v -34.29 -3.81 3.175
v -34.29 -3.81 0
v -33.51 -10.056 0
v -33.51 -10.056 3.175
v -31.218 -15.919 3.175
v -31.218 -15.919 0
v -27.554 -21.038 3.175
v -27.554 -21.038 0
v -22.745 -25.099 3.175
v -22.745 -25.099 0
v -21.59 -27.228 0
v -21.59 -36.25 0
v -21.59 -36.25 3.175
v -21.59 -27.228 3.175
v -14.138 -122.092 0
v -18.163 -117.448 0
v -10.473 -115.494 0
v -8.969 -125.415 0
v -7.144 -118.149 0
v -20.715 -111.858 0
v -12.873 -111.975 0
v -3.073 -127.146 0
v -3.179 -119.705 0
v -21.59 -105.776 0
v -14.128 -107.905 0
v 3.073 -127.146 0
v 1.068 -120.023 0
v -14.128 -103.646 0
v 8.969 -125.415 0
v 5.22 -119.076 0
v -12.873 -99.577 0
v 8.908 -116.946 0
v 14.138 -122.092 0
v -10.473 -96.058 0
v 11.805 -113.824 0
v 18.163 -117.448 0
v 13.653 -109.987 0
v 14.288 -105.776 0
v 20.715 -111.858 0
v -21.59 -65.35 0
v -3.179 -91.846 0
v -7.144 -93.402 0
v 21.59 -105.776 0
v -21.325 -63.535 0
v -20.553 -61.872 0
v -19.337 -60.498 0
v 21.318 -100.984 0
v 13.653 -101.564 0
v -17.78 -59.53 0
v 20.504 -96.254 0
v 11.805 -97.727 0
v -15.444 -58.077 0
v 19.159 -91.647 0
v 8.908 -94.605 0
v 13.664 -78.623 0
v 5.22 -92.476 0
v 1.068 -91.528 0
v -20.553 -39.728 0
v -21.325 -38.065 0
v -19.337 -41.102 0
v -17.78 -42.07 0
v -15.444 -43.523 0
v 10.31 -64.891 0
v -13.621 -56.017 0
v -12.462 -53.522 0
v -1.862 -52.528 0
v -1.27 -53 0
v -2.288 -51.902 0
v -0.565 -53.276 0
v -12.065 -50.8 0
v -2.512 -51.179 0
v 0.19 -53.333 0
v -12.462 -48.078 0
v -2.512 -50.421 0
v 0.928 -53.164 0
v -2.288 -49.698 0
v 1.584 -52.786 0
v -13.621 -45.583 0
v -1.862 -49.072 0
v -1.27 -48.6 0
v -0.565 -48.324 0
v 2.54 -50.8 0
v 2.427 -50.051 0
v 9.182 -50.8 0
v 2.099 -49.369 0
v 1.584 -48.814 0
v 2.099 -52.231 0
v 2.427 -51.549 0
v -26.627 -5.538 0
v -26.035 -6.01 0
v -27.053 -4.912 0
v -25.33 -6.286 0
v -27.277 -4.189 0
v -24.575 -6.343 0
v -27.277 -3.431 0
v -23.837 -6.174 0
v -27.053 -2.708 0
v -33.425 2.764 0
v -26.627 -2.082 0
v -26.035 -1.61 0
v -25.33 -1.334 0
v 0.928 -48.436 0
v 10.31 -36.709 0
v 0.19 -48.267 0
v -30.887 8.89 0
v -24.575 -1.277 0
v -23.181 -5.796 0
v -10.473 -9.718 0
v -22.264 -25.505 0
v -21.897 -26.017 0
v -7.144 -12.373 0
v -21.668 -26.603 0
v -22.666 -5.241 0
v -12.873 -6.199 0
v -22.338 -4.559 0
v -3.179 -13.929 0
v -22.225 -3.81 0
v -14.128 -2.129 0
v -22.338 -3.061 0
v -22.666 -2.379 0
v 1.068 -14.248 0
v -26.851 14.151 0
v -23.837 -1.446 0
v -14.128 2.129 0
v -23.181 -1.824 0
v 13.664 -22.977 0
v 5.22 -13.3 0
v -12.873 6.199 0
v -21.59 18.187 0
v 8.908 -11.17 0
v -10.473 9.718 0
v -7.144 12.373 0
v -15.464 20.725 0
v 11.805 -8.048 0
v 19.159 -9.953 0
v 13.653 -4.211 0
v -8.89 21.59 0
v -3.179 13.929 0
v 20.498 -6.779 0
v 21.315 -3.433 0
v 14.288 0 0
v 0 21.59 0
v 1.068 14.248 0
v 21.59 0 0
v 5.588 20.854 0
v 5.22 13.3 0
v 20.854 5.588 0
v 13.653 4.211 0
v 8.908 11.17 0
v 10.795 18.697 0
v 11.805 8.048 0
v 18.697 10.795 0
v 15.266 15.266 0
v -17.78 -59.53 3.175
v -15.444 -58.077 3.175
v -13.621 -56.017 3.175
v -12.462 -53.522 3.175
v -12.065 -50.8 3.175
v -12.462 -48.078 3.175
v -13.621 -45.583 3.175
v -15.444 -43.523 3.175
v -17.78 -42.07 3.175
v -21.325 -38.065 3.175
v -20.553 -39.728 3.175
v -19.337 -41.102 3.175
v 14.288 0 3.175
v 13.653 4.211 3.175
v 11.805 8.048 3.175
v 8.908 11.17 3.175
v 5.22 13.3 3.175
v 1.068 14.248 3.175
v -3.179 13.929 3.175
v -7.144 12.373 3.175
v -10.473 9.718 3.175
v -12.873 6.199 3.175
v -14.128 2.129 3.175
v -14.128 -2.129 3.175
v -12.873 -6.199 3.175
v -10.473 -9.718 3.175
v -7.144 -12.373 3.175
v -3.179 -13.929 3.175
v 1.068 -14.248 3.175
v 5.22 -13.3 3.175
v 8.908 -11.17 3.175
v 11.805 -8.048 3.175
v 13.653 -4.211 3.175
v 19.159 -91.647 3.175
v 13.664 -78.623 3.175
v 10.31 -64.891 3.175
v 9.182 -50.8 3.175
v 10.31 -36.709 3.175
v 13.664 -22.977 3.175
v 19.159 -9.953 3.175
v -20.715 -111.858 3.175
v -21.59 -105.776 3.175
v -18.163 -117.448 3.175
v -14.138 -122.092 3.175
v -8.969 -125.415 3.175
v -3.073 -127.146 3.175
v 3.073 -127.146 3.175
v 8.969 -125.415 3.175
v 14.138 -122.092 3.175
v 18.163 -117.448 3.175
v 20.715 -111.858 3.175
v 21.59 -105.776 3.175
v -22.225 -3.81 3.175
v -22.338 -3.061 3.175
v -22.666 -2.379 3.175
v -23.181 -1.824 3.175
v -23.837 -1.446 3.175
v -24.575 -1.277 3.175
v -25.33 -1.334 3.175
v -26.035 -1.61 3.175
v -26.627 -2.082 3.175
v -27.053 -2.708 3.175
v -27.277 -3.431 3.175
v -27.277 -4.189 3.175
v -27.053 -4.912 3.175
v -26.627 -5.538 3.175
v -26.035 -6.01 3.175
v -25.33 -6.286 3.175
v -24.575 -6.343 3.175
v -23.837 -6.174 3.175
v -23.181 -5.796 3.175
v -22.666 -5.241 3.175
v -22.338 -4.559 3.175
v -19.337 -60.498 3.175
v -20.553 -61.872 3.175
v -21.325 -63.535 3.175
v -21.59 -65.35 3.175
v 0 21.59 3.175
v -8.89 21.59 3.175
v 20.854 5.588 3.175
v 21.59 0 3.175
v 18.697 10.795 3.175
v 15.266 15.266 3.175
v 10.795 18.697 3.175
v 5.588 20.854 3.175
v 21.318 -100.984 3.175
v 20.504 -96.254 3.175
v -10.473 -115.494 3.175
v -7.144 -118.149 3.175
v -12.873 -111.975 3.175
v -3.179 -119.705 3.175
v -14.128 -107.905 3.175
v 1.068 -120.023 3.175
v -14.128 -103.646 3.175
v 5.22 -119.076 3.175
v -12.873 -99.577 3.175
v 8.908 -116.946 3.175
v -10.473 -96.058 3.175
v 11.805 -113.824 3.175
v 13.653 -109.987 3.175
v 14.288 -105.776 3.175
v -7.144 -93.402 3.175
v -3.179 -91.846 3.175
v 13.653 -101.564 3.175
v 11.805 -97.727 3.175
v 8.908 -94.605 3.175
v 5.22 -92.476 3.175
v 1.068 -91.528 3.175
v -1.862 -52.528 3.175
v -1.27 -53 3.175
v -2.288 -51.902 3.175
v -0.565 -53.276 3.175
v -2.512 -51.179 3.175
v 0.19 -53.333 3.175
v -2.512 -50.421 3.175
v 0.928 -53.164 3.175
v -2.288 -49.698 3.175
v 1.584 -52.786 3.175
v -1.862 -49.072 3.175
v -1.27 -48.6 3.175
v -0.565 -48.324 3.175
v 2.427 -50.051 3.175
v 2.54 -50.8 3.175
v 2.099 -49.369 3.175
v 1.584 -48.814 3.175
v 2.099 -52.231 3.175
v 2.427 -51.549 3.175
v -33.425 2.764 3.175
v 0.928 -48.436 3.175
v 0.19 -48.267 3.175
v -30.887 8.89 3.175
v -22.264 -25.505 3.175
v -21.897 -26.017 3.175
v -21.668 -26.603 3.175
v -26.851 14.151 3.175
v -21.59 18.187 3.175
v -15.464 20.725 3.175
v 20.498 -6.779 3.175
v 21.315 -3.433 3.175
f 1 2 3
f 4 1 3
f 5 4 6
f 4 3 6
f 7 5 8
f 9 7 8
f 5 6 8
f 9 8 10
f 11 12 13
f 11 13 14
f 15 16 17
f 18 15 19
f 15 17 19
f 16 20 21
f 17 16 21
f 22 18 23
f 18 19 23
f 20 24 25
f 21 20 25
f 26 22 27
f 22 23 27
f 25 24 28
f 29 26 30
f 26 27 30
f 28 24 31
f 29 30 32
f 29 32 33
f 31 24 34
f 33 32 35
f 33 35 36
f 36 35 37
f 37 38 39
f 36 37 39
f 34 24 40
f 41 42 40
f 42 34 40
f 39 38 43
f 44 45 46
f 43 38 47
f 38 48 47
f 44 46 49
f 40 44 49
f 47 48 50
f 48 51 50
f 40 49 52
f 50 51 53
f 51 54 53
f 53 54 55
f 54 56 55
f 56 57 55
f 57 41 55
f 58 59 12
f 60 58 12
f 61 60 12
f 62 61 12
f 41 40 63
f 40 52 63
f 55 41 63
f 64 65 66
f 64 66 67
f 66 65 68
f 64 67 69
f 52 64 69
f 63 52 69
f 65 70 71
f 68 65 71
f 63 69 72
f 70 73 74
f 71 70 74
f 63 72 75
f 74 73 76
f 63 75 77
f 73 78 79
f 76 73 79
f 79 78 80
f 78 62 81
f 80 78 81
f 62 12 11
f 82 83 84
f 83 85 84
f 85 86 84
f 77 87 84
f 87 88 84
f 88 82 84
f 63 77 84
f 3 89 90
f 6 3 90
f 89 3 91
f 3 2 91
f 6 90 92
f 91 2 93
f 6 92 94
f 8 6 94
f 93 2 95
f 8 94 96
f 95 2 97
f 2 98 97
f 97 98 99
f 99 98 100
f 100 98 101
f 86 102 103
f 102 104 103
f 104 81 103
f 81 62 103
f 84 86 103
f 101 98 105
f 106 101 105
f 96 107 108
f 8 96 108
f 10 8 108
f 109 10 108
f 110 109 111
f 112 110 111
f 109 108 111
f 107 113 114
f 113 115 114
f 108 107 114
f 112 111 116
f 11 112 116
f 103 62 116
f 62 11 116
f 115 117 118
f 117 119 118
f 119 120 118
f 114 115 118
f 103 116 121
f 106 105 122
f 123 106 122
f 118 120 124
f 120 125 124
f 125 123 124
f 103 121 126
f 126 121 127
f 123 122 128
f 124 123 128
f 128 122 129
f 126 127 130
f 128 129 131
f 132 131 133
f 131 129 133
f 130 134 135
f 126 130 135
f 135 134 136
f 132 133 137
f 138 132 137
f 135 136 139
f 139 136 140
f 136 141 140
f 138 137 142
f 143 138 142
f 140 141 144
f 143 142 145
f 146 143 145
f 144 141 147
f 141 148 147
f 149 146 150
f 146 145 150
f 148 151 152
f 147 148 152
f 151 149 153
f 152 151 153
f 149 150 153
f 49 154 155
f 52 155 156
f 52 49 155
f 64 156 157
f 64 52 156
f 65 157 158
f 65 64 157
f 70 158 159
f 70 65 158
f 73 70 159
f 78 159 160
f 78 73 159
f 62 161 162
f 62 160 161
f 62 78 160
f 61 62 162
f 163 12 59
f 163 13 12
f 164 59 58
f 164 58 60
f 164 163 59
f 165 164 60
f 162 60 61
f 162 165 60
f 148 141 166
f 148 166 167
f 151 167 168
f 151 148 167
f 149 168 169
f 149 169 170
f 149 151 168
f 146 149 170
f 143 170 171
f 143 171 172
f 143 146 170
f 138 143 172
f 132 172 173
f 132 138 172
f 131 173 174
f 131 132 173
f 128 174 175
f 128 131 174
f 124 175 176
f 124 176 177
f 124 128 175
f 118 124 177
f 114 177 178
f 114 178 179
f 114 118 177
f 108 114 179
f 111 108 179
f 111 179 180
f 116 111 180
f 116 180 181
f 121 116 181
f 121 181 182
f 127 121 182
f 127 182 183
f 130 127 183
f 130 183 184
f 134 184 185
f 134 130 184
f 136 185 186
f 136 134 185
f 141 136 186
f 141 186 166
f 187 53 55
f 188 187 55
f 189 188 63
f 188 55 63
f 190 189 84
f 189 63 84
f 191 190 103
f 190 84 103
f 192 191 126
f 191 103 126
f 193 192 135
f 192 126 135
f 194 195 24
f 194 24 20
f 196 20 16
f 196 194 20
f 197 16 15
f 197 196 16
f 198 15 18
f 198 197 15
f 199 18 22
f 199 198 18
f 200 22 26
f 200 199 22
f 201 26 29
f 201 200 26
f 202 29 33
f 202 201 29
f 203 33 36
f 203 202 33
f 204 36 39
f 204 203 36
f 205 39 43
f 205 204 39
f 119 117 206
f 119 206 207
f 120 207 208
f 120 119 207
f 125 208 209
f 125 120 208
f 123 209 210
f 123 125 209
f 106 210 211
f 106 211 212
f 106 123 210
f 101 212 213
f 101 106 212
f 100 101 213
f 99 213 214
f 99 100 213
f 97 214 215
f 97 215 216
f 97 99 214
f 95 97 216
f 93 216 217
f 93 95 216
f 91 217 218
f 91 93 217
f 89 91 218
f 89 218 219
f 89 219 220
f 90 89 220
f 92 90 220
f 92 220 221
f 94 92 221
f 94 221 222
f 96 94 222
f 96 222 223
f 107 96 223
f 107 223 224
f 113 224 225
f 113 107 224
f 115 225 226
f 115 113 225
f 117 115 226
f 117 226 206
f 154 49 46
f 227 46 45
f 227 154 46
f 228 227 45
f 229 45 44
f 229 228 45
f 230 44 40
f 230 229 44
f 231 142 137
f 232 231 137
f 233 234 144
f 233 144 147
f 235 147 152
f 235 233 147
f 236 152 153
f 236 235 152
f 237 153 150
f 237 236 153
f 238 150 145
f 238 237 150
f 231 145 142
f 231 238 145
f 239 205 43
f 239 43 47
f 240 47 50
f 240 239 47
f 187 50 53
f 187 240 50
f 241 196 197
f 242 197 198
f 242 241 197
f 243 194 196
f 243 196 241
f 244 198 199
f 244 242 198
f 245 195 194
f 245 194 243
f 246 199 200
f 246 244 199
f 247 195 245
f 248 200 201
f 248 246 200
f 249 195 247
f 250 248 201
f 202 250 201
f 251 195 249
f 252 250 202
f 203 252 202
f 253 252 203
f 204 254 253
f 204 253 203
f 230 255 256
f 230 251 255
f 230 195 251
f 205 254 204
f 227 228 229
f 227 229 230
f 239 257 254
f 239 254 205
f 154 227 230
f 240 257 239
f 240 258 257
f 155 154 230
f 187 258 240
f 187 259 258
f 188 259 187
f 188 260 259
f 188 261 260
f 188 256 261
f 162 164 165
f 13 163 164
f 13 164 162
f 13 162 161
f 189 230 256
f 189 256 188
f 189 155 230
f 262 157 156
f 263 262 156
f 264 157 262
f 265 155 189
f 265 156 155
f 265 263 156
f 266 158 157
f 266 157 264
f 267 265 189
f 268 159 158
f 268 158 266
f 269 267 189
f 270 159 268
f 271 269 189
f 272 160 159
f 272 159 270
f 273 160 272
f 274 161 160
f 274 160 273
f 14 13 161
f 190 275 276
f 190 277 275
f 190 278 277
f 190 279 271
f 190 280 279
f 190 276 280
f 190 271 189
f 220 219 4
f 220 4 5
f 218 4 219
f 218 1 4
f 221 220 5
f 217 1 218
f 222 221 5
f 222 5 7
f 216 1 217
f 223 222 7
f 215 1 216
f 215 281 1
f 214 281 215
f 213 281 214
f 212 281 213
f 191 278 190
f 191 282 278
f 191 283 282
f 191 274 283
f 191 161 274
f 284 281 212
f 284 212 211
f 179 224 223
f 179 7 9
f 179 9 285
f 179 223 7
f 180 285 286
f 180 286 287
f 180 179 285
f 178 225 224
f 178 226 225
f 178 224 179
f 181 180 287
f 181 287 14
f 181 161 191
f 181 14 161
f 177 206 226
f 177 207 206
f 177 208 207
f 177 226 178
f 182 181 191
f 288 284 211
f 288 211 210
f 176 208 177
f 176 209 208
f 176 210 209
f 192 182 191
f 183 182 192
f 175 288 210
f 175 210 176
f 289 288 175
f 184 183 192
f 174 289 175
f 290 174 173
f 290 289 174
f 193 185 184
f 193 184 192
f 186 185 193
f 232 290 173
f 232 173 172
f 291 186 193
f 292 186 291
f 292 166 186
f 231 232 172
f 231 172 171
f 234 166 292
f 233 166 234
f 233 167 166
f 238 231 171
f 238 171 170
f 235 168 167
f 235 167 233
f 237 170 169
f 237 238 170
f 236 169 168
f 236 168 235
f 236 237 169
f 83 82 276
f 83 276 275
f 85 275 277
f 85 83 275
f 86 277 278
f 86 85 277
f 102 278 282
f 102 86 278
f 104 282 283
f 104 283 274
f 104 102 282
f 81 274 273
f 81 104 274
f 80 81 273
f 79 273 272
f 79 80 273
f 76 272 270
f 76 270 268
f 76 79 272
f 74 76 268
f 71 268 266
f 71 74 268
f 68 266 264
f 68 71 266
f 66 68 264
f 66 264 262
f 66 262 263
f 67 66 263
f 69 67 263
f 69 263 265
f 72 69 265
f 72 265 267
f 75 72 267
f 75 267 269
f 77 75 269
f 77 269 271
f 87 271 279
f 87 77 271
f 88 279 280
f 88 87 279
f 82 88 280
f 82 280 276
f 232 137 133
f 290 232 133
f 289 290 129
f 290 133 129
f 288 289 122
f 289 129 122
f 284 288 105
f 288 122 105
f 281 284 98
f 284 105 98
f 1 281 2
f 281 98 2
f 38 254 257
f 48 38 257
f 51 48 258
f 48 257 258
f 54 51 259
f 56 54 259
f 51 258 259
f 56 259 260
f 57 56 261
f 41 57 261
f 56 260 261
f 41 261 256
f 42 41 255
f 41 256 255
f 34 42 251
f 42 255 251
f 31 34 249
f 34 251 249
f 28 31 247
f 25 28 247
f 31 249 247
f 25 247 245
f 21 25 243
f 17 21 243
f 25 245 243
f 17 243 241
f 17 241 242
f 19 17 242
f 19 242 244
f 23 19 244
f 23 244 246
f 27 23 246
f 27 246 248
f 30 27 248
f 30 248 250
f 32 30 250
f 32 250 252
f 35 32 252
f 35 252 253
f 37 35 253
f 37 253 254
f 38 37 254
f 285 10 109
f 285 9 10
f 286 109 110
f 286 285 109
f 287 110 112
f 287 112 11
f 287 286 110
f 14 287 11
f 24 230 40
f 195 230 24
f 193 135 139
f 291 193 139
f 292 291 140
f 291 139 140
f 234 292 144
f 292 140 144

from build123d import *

# Parameters (mm, degrees)
SKETCH1_R            = 14.2875
SKETCH1_R_2          = 2.54
BOSS_EXTRUDE1_DEPTH  = 3.175
CUT_EXTRUDE1_DEPTH   = 162.674043733
FILLET3_R            = 6.35
BOSS_EXTRUDE3_START  = -3.175
SKETCH3_R            = 2.54
BOSS_EXTRUDE3_DEPTH  = 3.175
SKETCH6_R            = 2.54
BOSS_EXTRUDE4_DEPTH  = 3.175
FILLET2_R            = 6.35
CUT_EXTRUDE2_DEPTH   = 168.423732074
CUT_EXTRUDE3_DEPTH   = 168.423732074
CUT_EXTRUDE4_DEPTH   = 168.265702461
BOSS_EXTRUDE8_START  = -3.175
SKETCH15_R           = 2.54
BOSS_EXTRUDE8_DEPTH  = 3.175
FILLET4_R            = 2.54
BOSS_EXTRUDE9_DEPTH  = 3.175
SKETCH17_R           = 14.2875
BOSS_EXTRUDE10_DEPTH = 3.175
CUT_EXTRUDE5_DEPTH   = 132.939082706
SKETCH20_R           = 14.2875
CUT_EXTRUDE6_DEPTH   = 132.939082706


with BuildPart() as part:
    # Sketch1 → Boss-Extrude1 (new body)
    with BuildSketch(Plane.XY):
        with BuildLine():
            Line((-8.89, 25.4), (8.89, 25.4))
            ThreePointArc((8.89, 25.4), (17.870256121, 21.680256121), (21.59, 12.7))
            Line((21.59, 12.7), (21.59, -117.775079775))
            ThreePointArc((21.59, -117.775079775), (21.127743647, -120.388718212), (19.797058824, -122.685251408))
            Line((19.797058824, -122.685251408), (-7.952696208, -155.616779465))
            ThreePointArc((-7.952696208, -155.616779465), (-12.268297602, -157.851943494), (-16.900388255, -156.380852124))
            Line((-16.900388255, -156.380852124), (-32.439211784, -143.287061102))
            ThreePointArc((-32.439211784, -143.287061102), (-34.674375812, -138.971459708), (-33.203284443, -134.339369055))
            Line((-33.203284443, -134.339369055), (-23.382941176, -122.685251408))
            ThreePointArc((-23.382941176, -122.685251408), (-22.052256353, -120.388718212), (-21.59, -117.775079775))
            Line((-21.59, -117.775079775), (-21.59, 12.7))
            ThreePointArc((-21.59, 12.7), (-17.870256121, 21.680256121), (-8.89, 25.4))
        make_face()
        Circle(SKETCH1_R, mode=Mode.SUBTRACT)
        with Locations((0, -101.6)):
            Circle(SKETCH1_R, mode=Mode.SUBTRACT)
        with Locations((-18.532085478, -142.550133084)):
            Circle(SKETCH1_R_2, mode=Mode.SUBTRACT)
        with Locations((0, -50.8)):
            Circle(SKETCH1_R_2, mode=Mode.SUBTRACT)
    extrude(amount=BOSS_EXTRUDE1_DEPTH)

    # Sketch2 → Cut-Extrude1 (cut, through all)
    with BuildSketch(Plane.XY):
        with BuildLine():
            ThreePointArc((19.159083004, -91.647229609), (9.182340769, -50.8), (19.159083004, -9.952770391))
            ThreePointArc((19.159083004, -9.952770391), (20.973467787, -5.122670102), (21.59, 0))
            Line((21.59, 0), (27.94, 0))
            Line((27.94, 0), (27.94, -121.656687185))
            Line((27.94, -121.656687185), (-7.789552878, -164.05809836))
            Line((-7.789552878, -164.05809836), (-17.501317584, -155.874478972))
            Line((-17.501317584, -155.874478972), (16.51, -115.512152961))
            ThreePointArc((16.51, -115.512152961), (20.280273667, -109.005308906), (21.59, -101.6))
            ThreePointArc((21.59, -101.6), (20.973467787, -96.477329898), (19.159083004, -91.647229609))
        make_face()
        with BuildLine():
            Line((-21.59, -41.275), (-21.59, -60.325))
            ThreePointArc((-21.59, -60.325), (-12.065, -50.8), (-21.59, -41.275))
        make_face()
    extrude(amount=CUT_EXTRUDE1_DEPTH, mode=Mode.SUBTRACT)

    # Fillet3
    fillet3_edges = [part.edges().sort_by_distance(p)[0] for p in [
        (-21.59, -41.275, 1.5875),
        (-21.59, -60.325, 1.5875),
    ]]
    fillet(fillet3_edges, radius=FILLET3_R)

    # Sketch3 → Boss-Extrude3 (add)
    with BuildSketch(Plane.XY.offset(3.175).offset(BOSS_EXTRUDE3_START)):
        with BuildLine():
            Line((-27.351416194, -127.394768527), (-36.025496499, -137.688579))
            ThreePointArc((-36.025496499, -137.688579), (-37.217489152, -141.441859142), (-35.4063854, -144.93869507))
            Line((-35.4063854, -144.93869507), (-24.403104784, -154.210610454))
            ThreePointArc((-24.403104784, -154.210610454), (-19.771014132, -155.681701823), (-15.455412737, -153.446537795))
            Line((-15.455412737, -153.446537795), (-7.557639641, -144.073996091))
            Line((-7.557639641, -144.073996091), (-27.351416194, -127.394768527))
        make_face()
        with Locations((-18.532085478, -142.550133084)):
            Circle(SKETCH3_R, mode=Mode.SUBTRACT)
    extrude(amount=BOSS_EXTRUDE3_DEPTH)

    # Sketch6 → Boss-Extrude4 (add)
    with BuildSketch(Plane.XY.offset(3.175)):
        Polygon((-35.4063854, -144.93869507), (-63.620410749, -121.164144113), (-51.344981666, -106.596497054), (-27.065569901, -127.055545526), align=None)
        with Locations((-52.626813855, -117.972130278)):
            Circle(SKETCH6_R, mode=Mode.SUBTRACT)
    extrude(amount=-BOSS_EXTRUDE4_DEPTH)

    # Fillet2
    fillet2_edges = [part.edges().sort_by_distance(p)[0] for p in [
        (-63.620410749, -121.164144113, 1.5875),
        (-51.344981666, -106.596497054, 1.5875),
        (-27.065569901, -127.055545526, 1.5875),
    ]]
    fillet(fillet2_edges, radius=FILLET2_R)

    # Sketch7 → Cut-Extrude2 (cut, through all)
    with BuildSketch(Plane.XY.offset(3.175)):
        with BuildLine():
            Line((-21.59, 0), (-21.59, 31.75))
            Line((-21.59, 31.75), (21.59, 31.75))
            Line((21.59, 31.75), (21.59, 0))
            ThreePointArc((21.59, 0), (0, 21.59), (-21.59, 0))
        make_face()
    extrude(amount=-CUT_EXTRUDE2_DEPTH, mode=Mode.SUBTRACT)

    # Sketch10 → Cut-Extrude3 (cut, through all)
    with BuildSketch(Plane.XY.offset(3.175)):
        with BuildLine():
            Line((-18.151882461, -155.32628042), (-17.361482582, -157.512020269))
            Line((-17.361482582, -157.512020269), (-14.375706423, -156.432313955))
            Line((-14.375706423, -156.432313955), (-15.455412737, -153.446537795))
            ThreePointArc((-15.455412737, -153.446537795), (-16.679911193, -154.563907595), (-18.151882461, -155.32628042))
        make_face()
    extrude(amount=-CUT_EXTRUDE3_DEPTH, mode=Mode.SUBTRACT)

    # Sketch12 → Cut-Extrude4 (cut, through all)
    with BuildSketch(Plane.XY.offset(3.175)):
        with BuildLine():
            Line((-21.59, -101.6), (-72.39, -101.6))
            Line((-72.39, -101.6), (-72.39, -165.1))
            Line((-72.39, -165.1), (16.51, -165.1))
            Line((16.51, -165.1), (16.51, -115.512152961))
            ThreePointArc((16.51, -115.512152961), (-7.405308906, -121.880273667), (-21.59, -101.6))
        make_face()
    extrude(amount=-CUT_EXTRUDE4_DEPTH, mode=Mode.SUBTRACT)

    # Sketch15 → Boss-Extrude8 (add)
    with BuildSketch(Plane.XY.offset(3.175).offset(BOSS_EXTRUDE8_START)):
        with BuildLine():
            ThreePointArc((-34.29, -3.81), (-30.887045256, -16.51), (-21.59, -25.807045256))
            Line((-21.59, -25.807045256), (-21.59, 0))
            ThreePointArc((-21.59, 0), (-15.266435406, 15.266435406), (0, 21.59))
            Line((0, 21.59), (-8.89, 21.59))
            ThreePointArc((-8.89, 21.59), (-26.850512242, 14.150512242), (-34.29, -3.81))
        make_face()
        with Locations((-24.765, -3.81)):
            Circle(SKETCH15_R, mode=Mode.SUBTRACT)
    extrude(amount=BOSS_EXTRUDE8_DEPTH)

    # Fillet4
    fillet4_edges = [part.edges().sort_by_distance(p)[0] for p in [
        (-21.59, -25.807045256, 1.5875),
    ]]
    fillet(fillet4_edges, radius=FILLET4_R)

    # Sketch16 → Boss-Extrude9 (add, through all)
    with BuildSketch(Plane.XY.offset(3.175)):
        with BuildLine():
            Line((-21.59, -101.6), (-21.59, -105.77576))
            ThreePointArc((-21.59, -105.77576), (0, -127.36576), (21.59, -105.77576))
            Line((21.59, -105.77576), (21.59, -101.6))
            Line((21.59, -101.6), (4.517920132, -121.700477095))
            Line((4.517920132, -121.700477095), (-1.489522905, -121.700477095))
            Line((-1.489522905, -121.700477095), (-21.59, -101.6))
        make_face()
    extrude(amount=-BOSS_EXTRUDE9_DEPTH)

    # Sketch17 → Boss-Extrude10 (add, through all)
    with BuildSketch(Plane.XY.offset(3.175)):
        with Locations((0, -101.6)):
            Circle(SKETCH17_R)
    extrude(amount=-BOSS_EXTRUDE10_DEPTH)

    # Sketch19 → Cut-Extrude5 (cut, through all)
    with BuildSketch(Plane.XY.offset(3.175)):
        with BuildLine():
            Line((19.159083004, -91.647229609), (21.59, -91.647229609))
            Line((21.59, -91.647229609), (21.59, -105.77576))
            ThreePointArc((21.59, -105.77576), (20.977838358, -98.607693167), (19.159083004, -91.647229609))
        make_face()
    extrude(amount=-CUT_EXTRUDE5_DEPTH, mode=Mode.SUBTRACT)

    # Sketch20 → Cut-Extrude6 (cut, through all)
    with BuildSketch(Plane.XY.offset(3.175)):
        with Locations((0, -105.77576)):
            Circle(SKETCH20_R)
    extrude(amount=-CUT_EXTRUDE6_DEPTH, mode=Mode.SUBTRACT)


solid = part.part
